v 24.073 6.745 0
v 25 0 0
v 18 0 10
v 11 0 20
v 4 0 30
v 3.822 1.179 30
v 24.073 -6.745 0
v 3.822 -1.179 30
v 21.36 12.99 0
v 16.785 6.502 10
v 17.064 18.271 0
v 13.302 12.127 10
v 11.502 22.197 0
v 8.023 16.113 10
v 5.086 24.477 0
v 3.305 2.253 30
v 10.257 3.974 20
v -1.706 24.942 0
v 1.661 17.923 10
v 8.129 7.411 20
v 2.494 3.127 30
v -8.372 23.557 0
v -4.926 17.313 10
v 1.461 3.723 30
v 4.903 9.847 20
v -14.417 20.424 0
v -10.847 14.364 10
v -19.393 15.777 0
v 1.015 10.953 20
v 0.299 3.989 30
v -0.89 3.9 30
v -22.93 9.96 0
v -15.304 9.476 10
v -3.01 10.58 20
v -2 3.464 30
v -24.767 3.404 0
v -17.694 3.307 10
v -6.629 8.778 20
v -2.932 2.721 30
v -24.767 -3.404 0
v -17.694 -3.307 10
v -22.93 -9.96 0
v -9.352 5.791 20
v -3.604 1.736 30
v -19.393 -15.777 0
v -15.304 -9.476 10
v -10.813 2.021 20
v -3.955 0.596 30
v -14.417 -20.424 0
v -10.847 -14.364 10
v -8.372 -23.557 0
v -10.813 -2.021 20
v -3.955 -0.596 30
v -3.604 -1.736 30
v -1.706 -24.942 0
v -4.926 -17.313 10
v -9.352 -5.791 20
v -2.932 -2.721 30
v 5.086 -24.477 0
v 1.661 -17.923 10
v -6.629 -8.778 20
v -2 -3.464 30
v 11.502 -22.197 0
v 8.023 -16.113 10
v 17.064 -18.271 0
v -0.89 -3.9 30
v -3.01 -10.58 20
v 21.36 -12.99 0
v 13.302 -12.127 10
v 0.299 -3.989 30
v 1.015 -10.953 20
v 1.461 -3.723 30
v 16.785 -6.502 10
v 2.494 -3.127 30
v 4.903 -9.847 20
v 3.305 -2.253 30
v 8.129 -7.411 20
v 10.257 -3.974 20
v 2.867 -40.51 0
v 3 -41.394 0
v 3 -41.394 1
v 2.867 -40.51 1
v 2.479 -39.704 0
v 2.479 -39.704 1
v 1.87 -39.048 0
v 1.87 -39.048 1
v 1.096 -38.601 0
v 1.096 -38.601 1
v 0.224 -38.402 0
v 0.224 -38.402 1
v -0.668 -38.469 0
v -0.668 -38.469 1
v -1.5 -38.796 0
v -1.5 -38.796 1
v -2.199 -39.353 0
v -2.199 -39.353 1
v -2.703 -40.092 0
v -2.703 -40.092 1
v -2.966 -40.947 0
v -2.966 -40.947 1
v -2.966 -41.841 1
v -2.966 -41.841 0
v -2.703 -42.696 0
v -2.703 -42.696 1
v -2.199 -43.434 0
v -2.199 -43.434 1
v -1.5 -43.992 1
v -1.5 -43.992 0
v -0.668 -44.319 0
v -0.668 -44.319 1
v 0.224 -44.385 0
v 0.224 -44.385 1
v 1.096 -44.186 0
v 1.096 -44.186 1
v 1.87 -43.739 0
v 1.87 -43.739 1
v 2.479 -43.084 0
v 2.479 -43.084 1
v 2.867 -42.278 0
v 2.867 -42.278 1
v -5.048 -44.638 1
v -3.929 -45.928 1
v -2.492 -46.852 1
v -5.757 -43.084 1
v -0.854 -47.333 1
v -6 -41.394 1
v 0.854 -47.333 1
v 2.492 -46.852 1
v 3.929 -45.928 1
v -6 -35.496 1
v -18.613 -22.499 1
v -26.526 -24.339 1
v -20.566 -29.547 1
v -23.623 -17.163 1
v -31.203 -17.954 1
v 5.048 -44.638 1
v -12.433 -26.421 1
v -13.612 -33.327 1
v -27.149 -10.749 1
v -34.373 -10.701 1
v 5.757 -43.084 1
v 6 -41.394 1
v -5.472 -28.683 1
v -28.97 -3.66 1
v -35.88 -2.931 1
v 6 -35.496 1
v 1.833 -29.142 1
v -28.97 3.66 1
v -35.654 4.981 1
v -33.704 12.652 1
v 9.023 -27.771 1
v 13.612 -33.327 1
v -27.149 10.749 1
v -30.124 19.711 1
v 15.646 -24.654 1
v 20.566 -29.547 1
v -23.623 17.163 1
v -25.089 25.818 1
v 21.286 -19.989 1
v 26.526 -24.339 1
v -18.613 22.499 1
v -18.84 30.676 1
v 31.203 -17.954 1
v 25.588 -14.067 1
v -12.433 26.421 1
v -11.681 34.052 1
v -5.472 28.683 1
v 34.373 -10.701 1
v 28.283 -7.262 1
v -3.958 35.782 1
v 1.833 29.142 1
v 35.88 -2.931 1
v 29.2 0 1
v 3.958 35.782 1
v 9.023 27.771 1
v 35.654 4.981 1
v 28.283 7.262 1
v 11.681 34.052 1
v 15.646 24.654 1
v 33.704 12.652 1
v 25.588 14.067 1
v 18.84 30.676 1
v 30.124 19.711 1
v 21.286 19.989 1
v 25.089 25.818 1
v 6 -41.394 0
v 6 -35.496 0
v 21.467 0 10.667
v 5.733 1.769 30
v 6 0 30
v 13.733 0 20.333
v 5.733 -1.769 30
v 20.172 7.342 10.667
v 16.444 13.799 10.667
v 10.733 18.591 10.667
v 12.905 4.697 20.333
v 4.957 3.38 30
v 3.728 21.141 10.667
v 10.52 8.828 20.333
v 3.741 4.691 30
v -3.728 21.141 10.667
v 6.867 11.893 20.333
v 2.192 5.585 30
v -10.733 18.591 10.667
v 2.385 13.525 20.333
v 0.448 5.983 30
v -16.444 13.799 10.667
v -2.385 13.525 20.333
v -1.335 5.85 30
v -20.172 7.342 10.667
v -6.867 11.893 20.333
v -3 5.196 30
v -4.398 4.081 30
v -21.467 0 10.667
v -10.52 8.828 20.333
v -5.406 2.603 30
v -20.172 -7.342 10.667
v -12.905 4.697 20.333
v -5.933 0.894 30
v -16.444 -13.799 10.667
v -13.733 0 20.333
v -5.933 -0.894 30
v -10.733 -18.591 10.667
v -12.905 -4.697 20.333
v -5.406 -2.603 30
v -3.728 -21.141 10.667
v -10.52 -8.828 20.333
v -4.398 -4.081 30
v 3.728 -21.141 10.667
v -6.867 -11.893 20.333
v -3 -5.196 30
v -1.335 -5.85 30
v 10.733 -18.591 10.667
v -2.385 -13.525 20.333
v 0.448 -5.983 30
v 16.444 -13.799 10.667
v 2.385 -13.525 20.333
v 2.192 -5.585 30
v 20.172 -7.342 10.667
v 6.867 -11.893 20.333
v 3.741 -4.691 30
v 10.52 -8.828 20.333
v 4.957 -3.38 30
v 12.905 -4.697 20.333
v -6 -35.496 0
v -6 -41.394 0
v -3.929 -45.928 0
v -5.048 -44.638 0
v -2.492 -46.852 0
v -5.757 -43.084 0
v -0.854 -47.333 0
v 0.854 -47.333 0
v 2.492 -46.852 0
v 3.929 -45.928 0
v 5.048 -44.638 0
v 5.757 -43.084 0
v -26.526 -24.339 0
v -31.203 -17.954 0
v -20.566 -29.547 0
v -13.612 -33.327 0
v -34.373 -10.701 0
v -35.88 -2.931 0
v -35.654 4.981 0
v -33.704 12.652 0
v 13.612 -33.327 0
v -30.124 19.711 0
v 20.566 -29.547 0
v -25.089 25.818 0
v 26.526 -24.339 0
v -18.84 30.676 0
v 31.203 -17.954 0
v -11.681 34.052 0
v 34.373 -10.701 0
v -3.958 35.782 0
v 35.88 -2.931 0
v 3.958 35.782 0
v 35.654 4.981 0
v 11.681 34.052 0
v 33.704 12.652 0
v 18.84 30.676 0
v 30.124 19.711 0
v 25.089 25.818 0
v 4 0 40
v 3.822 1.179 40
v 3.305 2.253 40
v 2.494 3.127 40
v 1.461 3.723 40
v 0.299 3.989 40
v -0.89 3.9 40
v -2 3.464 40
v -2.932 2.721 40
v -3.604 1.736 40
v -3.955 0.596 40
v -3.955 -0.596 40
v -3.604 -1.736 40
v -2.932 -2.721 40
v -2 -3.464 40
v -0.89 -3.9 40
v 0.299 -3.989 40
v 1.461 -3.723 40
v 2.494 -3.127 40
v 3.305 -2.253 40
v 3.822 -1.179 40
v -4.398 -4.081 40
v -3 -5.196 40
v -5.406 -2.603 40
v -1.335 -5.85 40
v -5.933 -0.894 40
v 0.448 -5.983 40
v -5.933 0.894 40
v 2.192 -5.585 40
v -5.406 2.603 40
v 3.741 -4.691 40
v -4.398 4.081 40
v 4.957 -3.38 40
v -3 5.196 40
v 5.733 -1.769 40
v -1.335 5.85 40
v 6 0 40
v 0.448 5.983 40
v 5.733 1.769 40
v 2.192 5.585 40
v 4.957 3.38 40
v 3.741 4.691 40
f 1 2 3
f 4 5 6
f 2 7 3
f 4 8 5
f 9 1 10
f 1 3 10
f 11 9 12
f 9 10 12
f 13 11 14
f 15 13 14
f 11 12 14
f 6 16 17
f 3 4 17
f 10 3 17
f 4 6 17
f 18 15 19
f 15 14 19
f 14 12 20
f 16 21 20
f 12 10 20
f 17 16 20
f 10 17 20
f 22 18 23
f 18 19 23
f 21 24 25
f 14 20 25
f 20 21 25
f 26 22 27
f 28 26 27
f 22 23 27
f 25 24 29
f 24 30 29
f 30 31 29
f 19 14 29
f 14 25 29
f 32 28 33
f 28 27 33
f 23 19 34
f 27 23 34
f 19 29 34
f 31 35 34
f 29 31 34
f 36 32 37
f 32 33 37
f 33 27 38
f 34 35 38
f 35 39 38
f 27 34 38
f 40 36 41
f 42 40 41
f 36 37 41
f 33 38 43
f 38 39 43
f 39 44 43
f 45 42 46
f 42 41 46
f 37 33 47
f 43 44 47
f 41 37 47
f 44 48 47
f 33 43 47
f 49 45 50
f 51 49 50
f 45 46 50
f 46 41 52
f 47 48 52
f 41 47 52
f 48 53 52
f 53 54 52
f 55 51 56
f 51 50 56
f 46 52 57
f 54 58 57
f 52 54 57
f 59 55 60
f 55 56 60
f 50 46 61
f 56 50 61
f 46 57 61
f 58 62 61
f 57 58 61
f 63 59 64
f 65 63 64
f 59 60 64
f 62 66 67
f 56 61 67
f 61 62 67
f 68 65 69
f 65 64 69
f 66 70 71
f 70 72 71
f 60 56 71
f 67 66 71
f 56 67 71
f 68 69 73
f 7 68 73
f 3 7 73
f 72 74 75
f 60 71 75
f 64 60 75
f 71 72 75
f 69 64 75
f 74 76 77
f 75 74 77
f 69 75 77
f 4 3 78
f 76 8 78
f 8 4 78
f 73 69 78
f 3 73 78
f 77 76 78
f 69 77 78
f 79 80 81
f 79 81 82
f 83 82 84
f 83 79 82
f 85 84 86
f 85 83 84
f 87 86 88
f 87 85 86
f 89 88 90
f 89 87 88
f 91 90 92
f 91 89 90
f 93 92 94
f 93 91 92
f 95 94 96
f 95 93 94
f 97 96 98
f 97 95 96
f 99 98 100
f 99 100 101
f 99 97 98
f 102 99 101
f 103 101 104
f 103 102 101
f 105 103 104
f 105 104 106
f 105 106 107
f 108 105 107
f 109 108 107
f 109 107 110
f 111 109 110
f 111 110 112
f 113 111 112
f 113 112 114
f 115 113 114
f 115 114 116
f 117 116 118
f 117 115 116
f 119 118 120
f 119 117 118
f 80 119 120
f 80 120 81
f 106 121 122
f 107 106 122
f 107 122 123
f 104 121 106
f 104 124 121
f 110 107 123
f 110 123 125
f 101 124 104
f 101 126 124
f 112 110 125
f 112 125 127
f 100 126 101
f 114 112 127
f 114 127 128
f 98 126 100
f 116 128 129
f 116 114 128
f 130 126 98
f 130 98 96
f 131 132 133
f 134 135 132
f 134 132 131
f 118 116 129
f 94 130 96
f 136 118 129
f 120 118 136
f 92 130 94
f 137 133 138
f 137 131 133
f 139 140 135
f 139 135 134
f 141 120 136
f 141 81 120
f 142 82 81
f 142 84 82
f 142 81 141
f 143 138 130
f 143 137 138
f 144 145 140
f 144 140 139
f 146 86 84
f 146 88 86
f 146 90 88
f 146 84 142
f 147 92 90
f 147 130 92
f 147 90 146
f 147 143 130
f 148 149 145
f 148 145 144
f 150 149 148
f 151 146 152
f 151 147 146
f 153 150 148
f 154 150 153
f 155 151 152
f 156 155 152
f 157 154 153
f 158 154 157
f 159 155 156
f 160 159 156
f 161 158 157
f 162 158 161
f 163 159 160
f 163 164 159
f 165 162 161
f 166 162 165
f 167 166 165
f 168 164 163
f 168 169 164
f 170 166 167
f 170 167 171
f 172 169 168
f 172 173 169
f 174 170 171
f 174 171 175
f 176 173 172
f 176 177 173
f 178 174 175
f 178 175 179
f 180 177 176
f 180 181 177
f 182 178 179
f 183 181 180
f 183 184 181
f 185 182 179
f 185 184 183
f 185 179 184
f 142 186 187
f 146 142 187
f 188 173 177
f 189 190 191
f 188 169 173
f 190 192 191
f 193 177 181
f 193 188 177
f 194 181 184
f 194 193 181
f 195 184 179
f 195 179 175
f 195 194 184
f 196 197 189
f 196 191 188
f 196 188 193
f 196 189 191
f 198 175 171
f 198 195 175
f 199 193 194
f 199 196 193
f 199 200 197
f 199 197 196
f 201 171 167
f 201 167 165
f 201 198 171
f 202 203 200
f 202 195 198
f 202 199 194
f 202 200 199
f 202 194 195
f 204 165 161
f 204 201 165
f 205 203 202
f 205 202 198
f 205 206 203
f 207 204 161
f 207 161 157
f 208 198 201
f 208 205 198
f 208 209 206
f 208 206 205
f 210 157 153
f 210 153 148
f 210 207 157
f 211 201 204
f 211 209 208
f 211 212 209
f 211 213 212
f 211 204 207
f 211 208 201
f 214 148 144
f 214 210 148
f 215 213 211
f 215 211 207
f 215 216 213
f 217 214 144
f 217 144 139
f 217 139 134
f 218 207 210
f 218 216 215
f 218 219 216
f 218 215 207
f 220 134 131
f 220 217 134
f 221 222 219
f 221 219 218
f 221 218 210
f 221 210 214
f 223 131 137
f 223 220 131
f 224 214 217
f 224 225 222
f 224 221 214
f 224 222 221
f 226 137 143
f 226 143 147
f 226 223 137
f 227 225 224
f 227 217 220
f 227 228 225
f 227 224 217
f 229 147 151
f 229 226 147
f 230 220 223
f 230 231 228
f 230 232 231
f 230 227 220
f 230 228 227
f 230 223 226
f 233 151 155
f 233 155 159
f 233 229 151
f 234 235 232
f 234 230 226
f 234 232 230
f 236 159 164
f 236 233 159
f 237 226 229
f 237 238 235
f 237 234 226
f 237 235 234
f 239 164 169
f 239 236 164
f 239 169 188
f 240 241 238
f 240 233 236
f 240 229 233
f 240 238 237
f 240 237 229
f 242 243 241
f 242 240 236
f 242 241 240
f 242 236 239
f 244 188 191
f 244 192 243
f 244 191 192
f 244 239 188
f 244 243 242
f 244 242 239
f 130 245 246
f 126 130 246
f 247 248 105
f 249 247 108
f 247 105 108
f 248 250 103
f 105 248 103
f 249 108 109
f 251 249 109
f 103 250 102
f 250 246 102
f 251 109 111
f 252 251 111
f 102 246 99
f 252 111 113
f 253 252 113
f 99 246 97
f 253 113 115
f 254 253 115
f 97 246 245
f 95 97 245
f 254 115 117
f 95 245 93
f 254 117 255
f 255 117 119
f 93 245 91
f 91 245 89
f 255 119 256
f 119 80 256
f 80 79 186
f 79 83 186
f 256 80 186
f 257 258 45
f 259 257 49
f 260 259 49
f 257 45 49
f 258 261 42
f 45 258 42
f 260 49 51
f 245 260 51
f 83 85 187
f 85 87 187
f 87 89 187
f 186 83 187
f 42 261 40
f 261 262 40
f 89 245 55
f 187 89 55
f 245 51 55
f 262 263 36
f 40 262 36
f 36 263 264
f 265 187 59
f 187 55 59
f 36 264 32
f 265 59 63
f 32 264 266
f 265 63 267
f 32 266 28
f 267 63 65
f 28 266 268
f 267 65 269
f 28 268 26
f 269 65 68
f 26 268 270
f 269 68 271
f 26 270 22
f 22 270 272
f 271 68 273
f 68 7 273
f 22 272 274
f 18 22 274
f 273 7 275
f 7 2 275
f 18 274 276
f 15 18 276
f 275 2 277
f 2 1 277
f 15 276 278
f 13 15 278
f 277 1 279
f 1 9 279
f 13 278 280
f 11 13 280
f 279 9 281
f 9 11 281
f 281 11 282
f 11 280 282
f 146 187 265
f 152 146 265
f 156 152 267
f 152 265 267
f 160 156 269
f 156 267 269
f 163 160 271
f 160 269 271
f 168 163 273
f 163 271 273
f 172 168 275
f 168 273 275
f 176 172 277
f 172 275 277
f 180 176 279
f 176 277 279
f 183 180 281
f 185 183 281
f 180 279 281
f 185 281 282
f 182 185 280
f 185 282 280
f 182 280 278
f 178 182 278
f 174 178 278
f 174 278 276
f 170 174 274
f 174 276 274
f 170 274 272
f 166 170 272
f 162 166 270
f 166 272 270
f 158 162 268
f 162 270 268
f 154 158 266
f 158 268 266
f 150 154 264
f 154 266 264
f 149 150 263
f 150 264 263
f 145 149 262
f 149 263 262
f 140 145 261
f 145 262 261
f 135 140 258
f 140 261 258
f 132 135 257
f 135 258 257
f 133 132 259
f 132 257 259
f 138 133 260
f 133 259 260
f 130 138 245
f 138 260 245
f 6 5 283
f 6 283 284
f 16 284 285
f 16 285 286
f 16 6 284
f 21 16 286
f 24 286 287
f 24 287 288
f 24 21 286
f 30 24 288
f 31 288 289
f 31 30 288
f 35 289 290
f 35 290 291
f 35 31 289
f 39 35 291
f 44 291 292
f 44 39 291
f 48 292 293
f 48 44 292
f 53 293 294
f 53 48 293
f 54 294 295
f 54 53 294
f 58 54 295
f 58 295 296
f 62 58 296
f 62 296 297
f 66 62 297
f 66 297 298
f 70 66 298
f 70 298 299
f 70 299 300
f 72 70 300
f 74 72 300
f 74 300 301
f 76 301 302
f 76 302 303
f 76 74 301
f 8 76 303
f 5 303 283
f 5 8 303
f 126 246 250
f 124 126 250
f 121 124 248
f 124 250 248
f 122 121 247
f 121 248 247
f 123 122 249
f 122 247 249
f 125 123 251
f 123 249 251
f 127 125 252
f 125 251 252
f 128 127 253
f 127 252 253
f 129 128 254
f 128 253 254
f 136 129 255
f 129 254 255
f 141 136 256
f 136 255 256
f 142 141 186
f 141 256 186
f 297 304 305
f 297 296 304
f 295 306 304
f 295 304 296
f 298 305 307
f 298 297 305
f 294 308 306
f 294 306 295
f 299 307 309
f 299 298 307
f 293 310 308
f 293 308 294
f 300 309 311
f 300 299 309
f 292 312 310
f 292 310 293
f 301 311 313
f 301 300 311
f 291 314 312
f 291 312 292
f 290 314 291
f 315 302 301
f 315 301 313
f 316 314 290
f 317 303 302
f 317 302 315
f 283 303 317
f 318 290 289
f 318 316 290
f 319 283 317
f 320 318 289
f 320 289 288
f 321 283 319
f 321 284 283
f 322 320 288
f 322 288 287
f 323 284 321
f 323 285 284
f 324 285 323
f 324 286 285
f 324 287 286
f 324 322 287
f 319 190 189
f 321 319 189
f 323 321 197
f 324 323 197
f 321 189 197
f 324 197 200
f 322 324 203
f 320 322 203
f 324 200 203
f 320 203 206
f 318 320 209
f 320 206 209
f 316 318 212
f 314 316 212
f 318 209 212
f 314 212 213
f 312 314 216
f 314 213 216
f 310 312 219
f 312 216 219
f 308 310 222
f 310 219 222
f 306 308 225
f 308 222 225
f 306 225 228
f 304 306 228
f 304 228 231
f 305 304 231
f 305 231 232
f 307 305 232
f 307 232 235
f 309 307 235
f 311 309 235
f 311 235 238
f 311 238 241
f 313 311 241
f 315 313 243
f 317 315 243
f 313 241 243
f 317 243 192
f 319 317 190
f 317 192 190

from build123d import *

# Parameters (mm, degrees)
F0_R      = 30
F2_R      = 6
F4_R      = 25
F5_R      = 4
F7_R      = 6
F7_R_2    = 4
F8_DEPTH  = 10
F9_R      = 3
F9_R_2    = 27
F10_DEPTH = 1


with BuildPart() as f3:
    # F0 (on Top) → F3 section 0
    with BuildSketch(Plane.XY):
        Circle(F0_R)
    # F2 (on offset) → F3 section 1
    with BuildSketch(Plane.XY.offset(30)):
        Circle(F2_R)
    loft()

    # F4 (on Top) → F6 section 0
    with BuildSketch(Plane.XY):
        Circle(F4_R)
    # F5 (on offset) → F6 section 1
    with BuildSketch(Plane.XY.offset(30)):
        Circle(F5_R)
    loft(mode=Mode.SUBTRACT)

    # F7 (on face) → F8 (join)
    with BuildSketch(Plane.XY.offset(30)):
        Circle(F7_R)
        Circle(F7_R_2, mode=Mode.SUBTRACT)
    extrude(amount=F8_DEPTH)

    # F9 (on Top) → F10 (join)
    with BuildSketch(Plane.XY):
        with BuildLine():
            ThreePointArc((6, -35.496479), (0, 36), (-6, -35.496479))
            Line((-6, -35.496479), (-6, -41.393877))
            ThreePointArc((-6, -41.393877), (0, -47.393877), (6, -41.393877))
            Line((6, -41.393877), (6, -35.496479))
        make_face()
        with Locations((0, -41.393877)):
            Circle(F9_R, mode=Mode.SUBTRACT)
        Circle(F9_R_2, mode=Mode.SUBTRACT)
    extrude(amount=F10_DEPTH)


solid = f3.part
